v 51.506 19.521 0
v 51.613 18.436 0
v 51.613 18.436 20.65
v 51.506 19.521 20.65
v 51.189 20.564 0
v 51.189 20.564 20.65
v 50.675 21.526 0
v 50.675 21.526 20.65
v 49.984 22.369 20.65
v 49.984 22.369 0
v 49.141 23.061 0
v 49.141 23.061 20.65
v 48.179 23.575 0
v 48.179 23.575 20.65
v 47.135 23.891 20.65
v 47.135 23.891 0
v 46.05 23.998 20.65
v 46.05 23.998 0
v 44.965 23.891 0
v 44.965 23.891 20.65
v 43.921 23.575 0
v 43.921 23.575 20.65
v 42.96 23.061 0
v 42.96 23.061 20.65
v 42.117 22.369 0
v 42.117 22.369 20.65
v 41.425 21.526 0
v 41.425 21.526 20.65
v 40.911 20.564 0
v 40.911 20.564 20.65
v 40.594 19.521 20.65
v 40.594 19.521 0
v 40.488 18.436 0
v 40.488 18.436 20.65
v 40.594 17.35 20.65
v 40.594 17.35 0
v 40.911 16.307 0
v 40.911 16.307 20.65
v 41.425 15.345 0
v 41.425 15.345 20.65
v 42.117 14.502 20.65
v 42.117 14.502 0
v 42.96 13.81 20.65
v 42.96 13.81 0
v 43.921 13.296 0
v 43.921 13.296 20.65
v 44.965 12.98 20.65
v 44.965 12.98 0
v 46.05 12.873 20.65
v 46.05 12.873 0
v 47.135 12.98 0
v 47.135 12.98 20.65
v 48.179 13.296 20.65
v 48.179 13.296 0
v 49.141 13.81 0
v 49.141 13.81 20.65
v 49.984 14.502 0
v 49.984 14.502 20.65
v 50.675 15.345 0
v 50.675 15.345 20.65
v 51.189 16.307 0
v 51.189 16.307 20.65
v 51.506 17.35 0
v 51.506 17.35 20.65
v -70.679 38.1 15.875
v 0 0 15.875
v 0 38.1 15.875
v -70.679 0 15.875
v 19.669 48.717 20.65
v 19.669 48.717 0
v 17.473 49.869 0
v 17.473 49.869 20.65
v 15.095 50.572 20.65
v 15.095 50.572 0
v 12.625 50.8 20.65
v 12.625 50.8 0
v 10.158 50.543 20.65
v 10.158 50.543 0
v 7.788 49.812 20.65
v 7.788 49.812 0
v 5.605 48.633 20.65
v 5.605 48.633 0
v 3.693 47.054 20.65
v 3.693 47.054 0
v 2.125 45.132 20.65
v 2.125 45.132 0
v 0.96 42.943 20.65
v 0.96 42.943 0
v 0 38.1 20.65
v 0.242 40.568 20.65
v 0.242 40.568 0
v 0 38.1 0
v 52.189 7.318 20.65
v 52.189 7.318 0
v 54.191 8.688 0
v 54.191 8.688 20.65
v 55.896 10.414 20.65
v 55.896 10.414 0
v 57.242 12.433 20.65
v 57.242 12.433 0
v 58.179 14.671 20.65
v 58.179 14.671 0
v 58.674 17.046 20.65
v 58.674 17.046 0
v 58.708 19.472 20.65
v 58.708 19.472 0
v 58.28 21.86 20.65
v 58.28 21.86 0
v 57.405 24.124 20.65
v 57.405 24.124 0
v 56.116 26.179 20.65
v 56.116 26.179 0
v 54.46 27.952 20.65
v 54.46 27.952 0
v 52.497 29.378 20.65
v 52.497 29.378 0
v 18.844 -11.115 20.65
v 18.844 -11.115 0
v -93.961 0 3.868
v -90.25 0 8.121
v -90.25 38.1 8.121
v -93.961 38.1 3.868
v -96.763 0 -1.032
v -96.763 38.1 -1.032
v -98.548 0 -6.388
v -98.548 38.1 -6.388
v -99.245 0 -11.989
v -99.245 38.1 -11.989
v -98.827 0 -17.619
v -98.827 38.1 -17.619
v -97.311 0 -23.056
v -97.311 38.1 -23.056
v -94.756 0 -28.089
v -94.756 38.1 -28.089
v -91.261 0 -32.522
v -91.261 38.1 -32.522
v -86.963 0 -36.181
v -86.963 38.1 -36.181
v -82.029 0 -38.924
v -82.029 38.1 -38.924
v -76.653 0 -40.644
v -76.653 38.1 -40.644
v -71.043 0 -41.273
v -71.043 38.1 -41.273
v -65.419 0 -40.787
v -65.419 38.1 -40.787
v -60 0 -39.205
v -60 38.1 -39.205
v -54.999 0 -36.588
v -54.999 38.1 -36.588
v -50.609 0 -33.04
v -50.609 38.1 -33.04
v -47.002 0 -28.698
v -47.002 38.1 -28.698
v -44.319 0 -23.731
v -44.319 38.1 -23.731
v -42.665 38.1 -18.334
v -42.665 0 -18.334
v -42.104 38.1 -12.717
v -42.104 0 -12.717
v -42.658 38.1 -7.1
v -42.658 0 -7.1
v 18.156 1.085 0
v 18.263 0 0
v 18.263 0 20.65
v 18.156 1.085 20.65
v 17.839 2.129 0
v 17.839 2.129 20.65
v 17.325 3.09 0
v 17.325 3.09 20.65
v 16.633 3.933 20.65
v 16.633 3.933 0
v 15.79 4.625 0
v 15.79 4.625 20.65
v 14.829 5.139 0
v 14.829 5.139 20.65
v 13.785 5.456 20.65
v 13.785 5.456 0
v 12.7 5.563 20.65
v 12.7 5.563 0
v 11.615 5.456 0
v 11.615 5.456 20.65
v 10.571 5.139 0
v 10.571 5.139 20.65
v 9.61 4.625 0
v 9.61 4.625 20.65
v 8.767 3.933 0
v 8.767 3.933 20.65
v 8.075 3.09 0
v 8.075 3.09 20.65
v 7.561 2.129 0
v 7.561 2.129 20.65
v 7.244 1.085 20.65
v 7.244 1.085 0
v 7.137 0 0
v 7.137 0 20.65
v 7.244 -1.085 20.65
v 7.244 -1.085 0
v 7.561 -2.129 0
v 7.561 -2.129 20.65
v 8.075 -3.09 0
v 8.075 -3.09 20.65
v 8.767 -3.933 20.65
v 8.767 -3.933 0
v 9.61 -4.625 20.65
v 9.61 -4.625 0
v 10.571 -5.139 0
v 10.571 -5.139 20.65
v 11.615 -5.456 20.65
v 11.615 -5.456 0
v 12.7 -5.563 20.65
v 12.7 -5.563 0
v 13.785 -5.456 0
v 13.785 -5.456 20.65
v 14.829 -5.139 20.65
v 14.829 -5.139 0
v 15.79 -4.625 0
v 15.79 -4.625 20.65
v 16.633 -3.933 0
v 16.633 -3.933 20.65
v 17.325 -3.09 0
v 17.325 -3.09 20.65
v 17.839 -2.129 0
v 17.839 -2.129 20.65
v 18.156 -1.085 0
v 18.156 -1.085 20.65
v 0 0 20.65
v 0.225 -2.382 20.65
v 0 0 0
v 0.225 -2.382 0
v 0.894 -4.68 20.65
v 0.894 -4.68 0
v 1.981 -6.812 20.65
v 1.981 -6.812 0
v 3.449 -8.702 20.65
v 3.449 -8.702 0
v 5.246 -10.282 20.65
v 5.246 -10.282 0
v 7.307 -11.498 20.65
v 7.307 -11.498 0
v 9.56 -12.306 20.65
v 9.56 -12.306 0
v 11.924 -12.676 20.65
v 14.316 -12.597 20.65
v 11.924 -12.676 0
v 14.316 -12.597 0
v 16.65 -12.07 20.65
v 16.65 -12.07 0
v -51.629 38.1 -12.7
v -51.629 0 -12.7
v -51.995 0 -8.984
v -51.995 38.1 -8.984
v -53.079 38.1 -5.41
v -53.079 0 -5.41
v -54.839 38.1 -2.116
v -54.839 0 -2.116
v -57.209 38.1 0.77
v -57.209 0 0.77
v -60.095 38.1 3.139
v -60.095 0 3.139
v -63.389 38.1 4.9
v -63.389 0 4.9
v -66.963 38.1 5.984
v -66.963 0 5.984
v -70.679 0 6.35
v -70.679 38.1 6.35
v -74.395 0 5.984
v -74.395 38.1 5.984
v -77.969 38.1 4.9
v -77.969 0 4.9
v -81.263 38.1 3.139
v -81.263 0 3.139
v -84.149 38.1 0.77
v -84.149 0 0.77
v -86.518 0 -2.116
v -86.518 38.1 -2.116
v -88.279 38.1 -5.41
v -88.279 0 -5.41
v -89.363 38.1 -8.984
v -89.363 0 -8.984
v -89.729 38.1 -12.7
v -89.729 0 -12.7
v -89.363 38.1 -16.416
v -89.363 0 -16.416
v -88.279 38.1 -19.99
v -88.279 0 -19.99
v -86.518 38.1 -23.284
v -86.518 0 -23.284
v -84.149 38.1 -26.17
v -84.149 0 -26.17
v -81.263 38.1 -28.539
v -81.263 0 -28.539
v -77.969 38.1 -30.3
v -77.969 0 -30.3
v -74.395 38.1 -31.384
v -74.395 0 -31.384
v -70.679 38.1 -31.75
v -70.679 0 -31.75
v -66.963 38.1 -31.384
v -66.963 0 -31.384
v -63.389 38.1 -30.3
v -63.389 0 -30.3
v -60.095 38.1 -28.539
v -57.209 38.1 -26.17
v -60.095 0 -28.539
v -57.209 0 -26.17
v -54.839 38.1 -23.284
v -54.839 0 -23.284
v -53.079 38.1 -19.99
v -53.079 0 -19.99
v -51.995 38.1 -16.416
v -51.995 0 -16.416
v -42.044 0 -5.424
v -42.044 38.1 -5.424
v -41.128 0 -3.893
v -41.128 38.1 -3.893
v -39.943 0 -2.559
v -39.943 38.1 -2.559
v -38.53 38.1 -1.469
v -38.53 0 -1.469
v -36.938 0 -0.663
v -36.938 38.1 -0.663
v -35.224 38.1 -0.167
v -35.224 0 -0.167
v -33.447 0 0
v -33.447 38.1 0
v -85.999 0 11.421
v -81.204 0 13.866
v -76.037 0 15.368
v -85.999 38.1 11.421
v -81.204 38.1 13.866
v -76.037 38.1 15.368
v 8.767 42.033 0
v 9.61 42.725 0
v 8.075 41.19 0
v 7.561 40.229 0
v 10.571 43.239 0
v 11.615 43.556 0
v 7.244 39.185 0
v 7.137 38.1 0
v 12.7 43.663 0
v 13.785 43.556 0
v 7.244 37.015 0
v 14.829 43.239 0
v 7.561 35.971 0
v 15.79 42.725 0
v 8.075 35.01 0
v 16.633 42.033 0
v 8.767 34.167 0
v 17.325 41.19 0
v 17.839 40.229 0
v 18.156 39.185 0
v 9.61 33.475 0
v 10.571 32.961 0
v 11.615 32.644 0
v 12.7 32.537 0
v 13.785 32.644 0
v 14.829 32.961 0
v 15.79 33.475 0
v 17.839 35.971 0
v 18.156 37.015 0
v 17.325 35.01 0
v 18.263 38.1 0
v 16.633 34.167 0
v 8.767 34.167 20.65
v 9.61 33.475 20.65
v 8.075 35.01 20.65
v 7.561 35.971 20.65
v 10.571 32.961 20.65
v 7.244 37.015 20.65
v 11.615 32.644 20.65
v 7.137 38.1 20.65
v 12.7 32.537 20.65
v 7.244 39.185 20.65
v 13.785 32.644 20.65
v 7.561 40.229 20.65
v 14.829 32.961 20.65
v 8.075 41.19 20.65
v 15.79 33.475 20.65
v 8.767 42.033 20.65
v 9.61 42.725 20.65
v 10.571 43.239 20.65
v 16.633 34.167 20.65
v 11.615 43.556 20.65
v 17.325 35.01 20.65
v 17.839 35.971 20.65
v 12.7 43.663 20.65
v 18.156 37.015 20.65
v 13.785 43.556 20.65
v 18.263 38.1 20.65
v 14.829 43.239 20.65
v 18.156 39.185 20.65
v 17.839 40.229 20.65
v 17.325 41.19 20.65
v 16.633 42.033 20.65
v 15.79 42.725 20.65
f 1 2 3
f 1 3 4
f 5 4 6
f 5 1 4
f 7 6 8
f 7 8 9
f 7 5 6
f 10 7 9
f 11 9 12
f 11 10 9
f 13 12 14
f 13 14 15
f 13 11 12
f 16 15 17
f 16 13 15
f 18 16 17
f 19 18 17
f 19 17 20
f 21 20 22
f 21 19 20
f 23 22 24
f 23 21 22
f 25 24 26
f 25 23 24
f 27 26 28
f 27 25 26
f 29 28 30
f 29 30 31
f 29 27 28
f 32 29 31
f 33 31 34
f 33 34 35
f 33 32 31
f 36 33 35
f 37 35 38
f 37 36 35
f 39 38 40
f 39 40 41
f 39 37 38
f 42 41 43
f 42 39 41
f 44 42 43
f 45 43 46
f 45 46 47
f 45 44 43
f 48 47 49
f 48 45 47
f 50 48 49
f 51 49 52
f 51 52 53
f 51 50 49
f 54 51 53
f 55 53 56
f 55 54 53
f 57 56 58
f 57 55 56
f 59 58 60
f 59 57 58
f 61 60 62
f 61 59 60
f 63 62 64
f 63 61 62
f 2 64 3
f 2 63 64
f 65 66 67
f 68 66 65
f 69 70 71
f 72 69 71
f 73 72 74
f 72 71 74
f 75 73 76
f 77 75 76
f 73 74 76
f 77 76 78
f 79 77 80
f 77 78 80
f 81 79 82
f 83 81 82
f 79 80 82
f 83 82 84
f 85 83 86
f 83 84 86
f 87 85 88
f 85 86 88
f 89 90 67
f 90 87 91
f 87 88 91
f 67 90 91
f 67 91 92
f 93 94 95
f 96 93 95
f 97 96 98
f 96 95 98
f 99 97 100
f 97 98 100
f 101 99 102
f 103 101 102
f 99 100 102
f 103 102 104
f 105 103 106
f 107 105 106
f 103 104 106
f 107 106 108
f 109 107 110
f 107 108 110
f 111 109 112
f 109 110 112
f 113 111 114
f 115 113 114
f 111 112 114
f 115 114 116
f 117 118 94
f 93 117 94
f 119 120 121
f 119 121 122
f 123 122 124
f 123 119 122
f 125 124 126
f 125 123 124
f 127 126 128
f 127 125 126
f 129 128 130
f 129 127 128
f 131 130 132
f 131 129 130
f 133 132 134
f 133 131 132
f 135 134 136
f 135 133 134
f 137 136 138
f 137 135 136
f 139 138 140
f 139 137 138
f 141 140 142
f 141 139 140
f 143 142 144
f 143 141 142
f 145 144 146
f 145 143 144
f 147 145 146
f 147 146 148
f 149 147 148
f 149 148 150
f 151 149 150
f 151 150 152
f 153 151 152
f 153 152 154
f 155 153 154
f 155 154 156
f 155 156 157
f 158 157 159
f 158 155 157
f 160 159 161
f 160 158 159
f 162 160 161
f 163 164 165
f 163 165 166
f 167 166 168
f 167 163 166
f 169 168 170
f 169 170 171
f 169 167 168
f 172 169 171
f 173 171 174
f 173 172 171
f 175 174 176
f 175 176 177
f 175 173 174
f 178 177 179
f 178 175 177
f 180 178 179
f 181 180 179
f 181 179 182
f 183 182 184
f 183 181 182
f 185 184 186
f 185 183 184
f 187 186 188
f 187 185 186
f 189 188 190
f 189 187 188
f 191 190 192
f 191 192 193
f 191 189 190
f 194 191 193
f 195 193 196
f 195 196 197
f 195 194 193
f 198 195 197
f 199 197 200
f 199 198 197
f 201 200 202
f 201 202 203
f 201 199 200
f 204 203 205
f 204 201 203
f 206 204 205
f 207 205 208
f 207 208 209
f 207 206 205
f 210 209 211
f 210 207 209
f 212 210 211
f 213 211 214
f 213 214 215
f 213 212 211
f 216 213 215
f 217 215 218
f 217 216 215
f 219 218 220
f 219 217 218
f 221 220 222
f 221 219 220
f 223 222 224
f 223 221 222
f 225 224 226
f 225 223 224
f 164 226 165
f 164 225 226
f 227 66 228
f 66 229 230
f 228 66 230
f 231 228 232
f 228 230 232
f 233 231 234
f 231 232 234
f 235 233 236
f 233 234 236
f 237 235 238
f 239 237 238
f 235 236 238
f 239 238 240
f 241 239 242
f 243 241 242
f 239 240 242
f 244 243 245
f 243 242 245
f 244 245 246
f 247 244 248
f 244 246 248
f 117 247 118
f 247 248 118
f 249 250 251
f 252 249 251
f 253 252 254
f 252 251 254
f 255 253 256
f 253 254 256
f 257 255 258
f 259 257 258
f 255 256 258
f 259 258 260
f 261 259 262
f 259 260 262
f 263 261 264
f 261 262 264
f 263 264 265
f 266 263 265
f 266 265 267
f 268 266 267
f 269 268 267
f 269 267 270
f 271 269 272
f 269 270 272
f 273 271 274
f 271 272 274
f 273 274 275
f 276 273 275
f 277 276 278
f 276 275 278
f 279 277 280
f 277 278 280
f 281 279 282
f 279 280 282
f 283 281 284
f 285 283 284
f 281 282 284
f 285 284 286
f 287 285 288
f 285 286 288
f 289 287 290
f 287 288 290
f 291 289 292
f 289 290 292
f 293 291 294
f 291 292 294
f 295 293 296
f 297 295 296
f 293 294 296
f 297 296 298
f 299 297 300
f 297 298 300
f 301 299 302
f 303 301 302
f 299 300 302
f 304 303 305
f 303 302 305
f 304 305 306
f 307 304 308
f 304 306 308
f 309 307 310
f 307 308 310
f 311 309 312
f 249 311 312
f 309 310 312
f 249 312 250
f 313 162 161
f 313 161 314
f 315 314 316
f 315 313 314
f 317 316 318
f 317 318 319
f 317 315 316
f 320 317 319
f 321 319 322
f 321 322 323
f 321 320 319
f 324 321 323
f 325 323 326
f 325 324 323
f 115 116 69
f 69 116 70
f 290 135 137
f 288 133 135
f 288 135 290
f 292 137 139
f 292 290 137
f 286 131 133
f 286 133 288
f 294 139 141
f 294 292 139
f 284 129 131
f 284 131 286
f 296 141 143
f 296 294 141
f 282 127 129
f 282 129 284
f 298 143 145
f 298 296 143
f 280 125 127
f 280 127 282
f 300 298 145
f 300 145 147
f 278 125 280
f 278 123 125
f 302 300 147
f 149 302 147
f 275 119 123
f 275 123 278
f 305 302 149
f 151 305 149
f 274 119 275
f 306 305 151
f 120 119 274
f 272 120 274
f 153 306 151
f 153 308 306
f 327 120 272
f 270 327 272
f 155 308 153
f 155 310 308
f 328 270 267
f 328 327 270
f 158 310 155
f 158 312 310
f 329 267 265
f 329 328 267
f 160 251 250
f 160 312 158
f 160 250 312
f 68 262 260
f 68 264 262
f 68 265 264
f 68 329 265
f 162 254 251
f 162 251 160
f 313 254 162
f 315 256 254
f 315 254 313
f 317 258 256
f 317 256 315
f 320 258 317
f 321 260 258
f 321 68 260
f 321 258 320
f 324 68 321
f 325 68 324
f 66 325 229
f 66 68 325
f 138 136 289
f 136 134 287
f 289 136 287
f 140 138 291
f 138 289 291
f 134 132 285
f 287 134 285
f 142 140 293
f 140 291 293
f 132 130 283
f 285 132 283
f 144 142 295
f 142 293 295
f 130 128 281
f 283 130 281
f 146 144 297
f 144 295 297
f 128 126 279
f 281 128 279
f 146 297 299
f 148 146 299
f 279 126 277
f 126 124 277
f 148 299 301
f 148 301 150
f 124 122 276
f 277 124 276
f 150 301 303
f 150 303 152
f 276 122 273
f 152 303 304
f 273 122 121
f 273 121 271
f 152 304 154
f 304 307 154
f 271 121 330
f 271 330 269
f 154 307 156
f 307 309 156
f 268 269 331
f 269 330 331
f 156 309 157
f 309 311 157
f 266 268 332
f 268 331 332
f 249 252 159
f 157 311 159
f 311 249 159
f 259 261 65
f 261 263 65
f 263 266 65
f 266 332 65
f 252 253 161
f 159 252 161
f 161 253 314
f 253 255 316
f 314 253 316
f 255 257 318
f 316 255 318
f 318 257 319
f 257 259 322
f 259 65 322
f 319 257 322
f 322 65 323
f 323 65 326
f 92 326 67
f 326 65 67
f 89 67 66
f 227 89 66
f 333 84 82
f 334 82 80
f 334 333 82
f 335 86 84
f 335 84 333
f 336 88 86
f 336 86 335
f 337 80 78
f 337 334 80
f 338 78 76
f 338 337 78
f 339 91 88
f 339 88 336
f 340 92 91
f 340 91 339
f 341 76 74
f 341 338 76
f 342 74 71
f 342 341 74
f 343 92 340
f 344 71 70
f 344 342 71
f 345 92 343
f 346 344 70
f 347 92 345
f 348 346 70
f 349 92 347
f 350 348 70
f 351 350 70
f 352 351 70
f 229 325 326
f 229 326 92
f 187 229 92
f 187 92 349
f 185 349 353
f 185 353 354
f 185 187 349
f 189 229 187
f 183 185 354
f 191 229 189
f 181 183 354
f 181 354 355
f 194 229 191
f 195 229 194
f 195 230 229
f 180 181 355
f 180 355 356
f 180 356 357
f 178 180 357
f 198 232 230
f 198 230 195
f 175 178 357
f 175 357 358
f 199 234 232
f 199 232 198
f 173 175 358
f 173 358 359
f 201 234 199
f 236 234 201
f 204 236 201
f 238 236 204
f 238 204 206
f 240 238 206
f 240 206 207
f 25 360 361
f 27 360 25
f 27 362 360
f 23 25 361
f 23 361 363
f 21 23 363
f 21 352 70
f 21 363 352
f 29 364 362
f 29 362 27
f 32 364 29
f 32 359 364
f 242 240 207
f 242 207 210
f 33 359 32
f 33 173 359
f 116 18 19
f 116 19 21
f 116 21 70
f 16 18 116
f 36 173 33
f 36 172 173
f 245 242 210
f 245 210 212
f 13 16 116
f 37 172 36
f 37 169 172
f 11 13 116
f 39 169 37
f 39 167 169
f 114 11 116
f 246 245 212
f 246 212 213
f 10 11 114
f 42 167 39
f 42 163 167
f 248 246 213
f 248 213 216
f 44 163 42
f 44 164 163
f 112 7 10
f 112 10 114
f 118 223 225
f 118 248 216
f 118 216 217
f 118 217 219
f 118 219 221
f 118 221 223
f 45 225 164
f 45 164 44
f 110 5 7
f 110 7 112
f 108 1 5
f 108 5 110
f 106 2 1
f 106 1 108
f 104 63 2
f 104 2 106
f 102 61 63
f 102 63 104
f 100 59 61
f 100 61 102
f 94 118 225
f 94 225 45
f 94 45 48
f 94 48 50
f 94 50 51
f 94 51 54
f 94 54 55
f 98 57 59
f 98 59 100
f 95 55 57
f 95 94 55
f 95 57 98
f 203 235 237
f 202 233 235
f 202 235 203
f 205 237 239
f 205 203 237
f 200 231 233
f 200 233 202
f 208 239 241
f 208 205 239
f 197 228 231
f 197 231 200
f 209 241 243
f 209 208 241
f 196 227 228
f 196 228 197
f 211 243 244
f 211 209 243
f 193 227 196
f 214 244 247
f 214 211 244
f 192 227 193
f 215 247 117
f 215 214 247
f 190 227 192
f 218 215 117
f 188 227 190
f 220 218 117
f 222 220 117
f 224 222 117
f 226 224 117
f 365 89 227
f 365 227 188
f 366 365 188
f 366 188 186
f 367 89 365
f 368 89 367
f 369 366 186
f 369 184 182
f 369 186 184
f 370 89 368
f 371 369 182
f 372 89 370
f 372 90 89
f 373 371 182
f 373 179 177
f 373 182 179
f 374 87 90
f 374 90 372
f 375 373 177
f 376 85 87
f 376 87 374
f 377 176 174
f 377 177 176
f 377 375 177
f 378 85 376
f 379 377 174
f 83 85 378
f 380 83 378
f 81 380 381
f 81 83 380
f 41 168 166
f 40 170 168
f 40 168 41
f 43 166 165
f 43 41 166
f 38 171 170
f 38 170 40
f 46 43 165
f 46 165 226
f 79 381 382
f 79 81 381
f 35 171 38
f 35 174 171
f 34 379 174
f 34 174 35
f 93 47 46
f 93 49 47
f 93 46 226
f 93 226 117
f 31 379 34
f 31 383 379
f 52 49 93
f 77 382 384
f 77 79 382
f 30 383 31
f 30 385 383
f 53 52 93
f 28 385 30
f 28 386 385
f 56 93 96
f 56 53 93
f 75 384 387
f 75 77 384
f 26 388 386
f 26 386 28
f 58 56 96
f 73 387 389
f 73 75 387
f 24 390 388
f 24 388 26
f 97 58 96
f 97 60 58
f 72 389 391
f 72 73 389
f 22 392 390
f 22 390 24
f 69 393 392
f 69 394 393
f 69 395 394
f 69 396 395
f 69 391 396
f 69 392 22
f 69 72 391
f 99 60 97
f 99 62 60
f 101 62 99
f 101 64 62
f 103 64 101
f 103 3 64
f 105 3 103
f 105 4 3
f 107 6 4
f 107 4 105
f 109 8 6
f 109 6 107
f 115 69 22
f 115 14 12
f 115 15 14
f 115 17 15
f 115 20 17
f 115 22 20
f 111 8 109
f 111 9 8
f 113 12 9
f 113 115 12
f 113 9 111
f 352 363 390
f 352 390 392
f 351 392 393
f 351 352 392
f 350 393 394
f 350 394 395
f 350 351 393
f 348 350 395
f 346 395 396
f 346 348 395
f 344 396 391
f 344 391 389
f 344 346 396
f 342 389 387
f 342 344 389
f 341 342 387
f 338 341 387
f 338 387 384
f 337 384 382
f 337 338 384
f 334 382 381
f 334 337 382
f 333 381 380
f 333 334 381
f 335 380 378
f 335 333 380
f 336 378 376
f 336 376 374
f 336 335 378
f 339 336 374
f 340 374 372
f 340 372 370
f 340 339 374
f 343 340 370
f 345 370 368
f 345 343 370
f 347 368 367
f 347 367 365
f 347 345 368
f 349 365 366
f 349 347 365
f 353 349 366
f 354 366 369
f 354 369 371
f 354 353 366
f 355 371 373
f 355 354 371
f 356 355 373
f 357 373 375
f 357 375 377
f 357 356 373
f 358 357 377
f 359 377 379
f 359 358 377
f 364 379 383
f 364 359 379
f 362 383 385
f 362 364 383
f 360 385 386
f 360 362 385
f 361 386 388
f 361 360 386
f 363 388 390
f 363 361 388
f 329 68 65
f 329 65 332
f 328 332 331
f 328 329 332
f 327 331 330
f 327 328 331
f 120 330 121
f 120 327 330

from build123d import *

# Parameters (mm, degrees)
F0_R     = 5.5626
F1_DEPTH = 20.6502
F2_R     = 19.05
F3_DEPTH = 38.1


with BuildPart() as f1:
    # F0 (on Top) → F1 (new body)
    with BuildSketch(Plane.XY):
        with BuildLine():
            Line((0, 38.1), (0, 0))
            ThreePointArc((0, 0), (6.247883, -10.93893), (18.844124, -11.114843))
            Line((18.844124, -11.114843), (52.188654, 7.317527))
            ThreePointArc((52.188654, 7.317527), (58.748963, 18.258285), (52.496517, 29.377852))
            Line((52.496517, 29.377852), (19.66947, 48.716802))
            ThreePointArc((19.66947, 48.716802), (6.667682, 49.275918), (0, 38.1))
        make_face()
        with Locations((12.7, 0)):
            Circle(F0_R, mode=Mode.SUBTRACT)
        with Locations((46.0502, 18.435503)):
            Circle(F0_R, mode=Mode.SUBTRACT)
        with Locations((12.7, 38.1)):
            Circle(F0_R, mode=Mode.SUBTRACT)
    extrude(amount=F1_DEPTH)

    # F2 (on Front) → F3 (join)
    with BuildSketch(Plane.XZ):
        with BuildLine():
            Line((0, 0), (0, 15.875))
            Line((0, 15.875), (-70.678988, 15.875))
            ThreePointArc((-70.678988, 15.875), (-81.204468, 13.86586), (-90.249832, 8.120968))
            ThreePointArc((-90.249832, 8.120968), (-79.38338, -39.916983), (-42.658184, -7.099542))
            ThreePointArc((-42.658184, -7.099542), (-39.261941, -1.980859), (-33.44717, 0))
            Line((-33.44717, 0), (0, 0))
        make_face()
        with Locations((-70.678988, -12.7)):
            Circle(F2_R, mode=Mode.SUBTRACT)
    extrude(amount=-F3_DEPTH)


solid = f1.part
